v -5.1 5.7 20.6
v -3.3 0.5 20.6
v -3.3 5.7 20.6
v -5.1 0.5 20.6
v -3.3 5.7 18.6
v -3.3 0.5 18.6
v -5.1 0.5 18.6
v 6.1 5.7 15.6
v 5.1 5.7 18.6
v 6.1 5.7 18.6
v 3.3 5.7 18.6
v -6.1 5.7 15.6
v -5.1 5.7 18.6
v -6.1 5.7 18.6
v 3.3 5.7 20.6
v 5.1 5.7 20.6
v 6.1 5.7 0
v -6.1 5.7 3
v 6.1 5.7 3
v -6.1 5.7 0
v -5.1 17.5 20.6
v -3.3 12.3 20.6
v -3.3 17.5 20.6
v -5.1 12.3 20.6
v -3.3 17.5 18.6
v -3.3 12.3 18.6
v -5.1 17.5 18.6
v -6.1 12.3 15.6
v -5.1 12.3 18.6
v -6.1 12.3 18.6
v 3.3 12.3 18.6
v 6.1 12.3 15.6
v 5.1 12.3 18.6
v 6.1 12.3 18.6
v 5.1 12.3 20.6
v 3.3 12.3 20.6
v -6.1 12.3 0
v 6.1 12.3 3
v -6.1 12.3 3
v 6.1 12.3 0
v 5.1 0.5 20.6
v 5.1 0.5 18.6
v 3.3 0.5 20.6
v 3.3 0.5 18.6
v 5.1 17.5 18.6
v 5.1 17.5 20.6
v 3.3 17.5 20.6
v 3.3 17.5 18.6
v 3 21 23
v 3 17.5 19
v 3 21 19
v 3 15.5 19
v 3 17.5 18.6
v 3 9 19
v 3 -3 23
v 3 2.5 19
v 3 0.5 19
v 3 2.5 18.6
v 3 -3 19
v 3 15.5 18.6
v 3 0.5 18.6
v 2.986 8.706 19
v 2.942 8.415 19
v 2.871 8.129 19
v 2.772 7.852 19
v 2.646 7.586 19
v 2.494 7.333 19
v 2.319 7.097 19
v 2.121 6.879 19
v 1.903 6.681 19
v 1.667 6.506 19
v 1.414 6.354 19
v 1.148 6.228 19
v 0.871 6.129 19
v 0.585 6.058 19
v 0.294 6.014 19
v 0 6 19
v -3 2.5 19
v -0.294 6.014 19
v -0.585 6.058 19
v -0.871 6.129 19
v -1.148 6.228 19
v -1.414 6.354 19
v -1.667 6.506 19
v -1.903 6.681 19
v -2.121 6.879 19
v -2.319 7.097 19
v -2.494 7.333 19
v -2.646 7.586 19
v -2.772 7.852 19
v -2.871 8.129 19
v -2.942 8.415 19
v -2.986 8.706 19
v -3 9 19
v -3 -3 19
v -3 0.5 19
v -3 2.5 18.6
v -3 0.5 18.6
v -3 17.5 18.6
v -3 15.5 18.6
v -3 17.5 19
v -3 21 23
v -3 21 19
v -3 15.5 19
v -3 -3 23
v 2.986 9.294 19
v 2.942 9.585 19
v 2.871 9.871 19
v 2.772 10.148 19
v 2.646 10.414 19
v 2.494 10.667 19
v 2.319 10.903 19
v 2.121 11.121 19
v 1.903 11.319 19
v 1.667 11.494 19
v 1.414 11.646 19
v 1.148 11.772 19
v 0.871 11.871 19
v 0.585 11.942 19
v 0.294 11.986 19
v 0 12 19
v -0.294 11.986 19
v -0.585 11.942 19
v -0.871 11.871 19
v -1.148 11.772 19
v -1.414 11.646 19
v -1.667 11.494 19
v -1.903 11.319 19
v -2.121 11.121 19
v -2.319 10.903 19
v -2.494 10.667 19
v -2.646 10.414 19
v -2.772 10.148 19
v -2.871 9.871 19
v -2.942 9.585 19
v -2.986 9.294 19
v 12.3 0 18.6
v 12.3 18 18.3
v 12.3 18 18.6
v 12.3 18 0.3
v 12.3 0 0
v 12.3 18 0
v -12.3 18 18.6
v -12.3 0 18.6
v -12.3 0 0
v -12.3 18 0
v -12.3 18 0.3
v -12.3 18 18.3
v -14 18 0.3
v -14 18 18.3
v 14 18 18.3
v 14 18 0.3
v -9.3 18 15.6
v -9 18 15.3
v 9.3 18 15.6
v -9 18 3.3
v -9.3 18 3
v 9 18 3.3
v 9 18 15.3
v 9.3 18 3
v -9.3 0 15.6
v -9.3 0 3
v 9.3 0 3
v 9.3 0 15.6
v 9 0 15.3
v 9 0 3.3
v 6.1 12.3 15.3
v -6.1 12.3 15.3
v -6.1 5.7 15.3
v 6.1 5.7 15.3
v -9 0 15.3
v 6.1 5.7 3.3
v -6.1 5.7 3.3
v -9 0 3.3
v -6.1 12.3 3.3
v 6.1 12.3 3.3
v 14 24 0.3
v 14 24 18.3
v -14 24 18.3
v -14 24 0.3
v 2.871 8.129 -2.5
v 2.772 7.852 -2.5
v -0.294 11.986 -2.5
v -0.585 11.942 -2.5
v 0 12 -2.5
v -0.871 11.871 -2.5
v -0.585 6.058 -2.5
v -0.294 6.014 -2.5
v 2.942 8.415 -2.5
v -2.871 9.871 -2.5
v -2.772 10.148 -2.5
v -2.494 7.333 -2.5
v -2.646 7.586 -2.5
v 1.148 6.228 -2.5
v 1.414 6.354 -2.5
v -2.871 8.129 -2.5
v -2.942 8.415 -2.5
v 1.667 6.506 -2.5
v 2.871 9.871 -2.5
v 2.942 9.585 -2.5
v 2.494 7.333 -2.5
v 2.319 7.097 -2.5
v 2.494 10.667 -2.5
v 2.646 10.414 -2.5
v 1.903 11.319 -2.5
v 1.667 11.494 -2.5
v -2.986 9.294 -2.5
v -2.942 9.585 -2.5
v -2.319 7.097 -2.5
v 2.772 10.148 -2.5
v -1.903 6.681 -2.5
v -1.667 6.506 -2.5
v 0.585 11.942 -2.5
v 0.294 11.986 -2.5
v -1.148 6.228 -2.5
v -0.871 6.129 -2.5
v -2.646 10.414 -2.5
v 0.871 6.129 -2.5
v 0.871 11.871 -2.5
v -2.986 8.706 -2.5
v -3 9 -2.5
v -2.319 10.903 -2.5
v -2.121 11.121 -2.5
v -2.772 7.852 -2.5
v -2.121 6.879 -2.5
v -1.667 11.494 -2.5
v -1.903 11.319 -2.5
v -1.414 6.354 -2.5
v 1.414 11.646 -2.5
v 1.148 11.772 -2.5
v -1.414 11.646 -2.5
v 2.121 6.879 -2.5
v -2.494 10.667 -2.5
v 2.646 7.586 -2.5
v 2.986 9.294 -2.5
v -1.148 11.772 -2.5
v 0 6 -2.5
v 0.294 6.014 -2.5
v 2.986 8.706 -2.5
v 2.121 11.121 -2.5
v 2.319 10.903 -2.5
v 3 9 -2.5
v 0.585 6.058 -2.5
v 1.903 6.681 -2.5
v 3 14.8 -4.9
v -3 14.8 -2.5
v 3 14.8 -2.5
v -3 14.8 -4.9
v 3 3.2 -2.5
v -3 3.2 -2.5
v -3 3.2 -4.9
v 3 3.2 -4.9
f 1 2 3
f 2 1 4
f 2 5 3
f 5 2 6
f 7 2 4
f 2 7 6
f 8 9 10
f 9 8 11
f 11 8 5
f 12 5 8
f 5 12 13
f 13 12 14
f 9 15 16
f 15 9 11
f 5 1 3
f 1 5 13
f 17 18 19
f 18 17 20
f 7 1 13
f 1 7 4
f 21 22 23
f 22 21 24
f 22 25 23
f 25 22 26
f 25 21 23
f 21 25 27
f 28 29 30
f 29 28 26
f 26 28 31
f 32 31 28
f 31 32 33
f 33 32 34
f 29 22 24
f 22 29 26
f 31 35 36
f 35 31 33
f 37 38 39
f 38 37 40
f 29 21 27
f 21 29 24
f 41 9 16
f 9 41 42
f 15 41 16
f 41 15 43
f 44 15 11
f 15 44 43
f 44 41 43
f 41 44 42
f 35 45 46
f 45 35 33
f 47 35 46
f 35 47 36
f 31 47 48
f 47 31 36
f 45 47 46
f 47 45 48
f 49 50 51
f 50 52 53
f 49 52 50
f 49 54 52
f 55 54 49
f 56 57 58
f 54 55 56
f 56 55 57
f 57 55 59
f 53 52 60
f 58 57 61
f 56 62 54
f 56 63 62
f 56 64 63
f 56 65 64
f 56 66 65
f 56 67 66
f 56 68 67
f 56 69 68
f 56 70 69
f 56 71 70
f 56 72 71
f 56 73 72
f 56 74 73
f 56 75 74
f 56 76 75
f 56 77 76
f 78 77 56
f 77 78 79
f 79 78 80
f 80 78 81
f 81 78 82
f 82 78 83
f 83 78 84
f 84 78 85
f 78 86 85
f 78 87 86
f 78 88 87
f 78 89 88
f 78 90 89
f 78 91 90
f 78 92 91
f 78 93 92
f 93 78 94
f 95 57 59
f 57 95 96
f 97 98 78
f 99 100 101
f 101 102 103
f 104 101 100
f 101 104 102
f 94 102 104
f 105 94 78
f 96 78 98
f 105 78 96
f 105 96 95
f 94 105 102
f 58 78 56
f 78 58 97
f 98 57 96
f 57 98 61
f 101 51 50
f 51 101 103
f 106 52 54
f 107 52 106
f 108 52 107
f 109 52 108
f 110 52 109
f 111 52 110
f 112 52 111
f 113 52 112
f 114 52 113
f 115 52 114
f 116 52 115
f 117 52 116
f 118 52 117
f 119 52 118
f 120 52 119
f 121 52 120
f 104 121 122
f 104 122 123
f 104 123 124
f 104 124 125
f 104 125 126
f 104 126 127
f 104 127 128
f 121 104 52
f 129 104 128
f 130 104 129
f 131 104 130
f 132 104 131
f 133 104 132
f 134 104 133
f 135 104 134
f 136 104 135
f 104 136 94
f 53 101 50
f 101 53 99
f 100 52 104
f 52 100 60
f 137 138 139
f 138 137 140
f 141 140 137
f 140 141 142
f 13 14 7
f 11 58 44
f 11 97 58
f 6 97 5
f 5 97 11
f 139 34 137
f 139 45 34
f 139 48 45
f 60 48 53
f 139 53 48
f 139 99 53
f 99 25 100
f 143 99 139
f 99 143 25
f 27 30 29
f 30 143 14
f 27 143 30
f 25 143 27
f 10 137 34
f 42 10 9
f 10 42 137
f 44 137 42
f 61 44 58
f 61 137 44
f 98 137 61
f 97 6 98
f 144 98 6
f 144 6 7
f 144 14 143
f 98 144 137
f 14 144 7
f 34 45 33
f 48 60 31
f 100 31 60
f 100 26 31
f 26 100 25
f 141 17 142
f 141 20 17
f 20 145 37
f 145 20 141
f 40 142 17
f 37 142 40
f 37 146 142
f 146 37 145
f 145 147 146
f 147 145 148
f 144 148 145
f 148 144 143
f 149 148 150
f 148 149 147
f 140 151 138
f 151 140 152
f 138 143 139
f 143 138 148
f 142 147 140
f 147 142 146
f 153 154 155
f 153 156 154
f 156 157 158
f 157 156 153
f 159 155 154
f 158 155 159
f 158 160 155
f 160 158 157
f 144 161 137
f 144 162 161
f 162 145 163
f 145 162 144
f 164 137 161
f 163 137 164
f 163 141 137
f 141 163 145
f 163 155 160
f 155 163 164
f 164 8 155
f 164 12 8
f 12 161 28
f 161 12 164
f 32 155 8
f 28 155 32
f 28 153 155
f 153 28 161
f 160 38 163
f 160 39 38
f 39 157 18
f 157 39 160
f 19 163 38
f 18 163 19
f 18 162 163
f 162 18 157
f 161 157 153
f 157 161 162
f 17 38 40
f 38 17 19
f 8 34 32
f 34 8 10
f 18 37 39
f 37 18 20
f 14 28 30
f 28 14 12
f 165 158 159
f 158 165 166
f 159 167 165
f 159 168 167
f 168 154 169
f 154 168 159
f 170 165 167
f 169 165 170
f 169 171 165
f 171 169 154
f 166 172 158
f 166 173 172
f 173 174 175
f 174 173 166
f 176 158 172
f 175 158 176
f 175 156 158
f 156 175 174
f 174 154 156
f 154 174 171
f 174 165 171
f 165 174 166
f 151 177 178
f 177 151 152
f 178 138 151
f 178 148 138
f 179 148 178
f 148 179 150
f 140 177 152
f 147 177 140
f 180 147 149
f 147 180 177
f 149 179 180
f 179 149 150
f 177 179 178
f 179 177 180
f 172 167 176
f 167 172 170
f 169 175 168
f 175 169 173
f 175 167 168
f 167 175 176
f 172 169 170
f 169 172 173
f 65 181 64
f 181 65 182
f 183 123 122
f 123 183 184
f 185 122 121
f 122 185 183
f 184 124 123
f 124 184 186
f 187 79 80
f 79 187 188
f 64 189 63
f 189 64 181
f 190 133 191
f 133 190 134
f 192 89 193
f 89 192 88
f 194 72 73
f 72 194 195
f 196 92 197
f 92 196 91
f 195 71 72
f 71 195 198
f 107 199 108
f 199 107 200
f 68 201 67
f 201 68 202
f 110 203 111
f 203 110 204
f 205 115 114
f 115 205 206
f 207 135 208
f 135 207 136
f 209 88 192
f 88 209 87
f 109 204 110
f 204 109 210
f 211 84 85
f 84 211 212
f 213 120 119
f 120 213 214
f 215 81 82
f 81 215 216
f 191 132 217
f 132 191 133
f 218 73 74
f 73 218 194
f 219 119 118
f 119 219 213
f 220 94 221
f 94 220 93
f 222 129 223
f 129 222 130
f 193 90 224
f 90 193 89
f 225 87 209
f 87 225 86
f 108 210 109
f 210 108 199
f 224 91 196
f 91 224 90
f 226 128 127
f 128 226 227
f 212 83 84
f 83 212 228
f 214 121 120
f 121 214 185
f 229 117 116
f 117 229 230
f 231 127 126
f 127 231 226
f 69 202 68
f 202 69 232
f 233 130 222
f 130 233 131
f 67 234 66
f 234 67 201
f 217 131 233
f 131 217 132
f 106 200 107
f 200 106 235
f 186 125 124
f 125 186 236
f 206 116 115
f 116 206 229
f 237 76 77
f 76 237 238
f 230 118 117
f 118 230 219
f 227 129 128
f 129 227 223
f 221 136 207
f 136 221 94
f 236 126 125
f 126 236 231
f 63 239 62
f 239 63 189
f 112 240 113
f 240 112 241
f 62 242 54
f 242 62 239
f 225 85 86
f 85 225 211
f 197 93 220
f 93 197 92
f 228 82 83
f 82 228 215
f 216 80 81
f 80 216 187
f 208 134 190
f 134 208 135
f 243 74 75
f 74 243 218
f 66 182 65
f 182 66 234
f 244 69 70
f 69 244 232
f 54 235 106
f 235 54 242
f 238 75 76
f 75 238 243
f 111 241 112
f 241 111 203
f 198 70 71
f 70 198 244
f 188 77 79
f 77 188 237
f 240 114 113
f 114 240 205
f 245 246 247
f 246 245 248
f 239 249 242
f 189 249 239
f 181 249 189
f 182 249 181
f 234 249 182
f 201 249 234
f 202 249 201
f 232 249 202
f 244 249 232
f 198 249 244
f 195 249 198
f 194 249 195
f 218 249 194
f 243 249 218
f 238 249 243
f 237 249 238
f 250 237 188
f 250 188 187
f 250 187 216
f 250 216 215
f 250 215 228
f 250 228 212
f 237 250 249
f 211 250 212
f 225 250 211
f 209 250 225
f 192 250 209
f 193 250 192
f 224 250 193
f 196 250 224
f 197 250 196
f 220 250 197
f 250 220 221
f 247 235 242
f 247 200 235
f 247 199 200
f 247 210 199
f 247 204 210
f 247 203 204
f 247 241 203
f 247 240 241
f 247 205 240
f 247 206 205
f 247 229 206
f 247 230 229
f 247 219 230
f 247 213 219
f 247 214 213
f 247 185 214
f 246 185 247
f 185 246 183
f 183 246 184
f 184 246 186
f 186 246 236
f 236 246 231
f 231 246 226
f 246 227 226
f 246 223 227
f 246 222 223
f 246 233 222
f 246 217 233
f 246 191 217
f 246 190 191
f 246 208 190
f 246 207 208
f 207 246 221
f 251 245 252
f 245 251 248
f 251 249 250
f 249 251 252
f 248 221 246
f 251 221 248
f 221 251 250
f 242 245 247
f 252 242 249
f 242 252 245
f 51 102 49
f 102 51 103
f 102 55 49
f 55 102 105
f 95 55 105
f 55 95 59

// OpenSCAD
// V8 REAR-JOINT COUPON ONLY. V7 rear connection retired after stuck/broken key.
// All PLA. No full support or brace revision is released by this file.
// Nominal values are trial fits, not empirically calibrated.
part="assembly"; // receiver, tongue, keeper, assembly, unlocked, exploded
$fn=64;
// Assembly coordinates: X across brace, Y tongue insertion, Z vertical.
// Receiver Y=0..18; tongue withdraws toward +Y. Keeper axis is Z.
receiver_w=24.6; receiver_l=18; receiver_h=18.6;
tongue_w=18; tongue_h=12; tongue_l=18;
slide_clearance=.3; // EACH FACE, total .6 mm in X and Z
keyhole_x=12.2;keyhole_y=6.6;
shaft_d=6; key_foot_x=11.6; key_foot_y=6;
head_z=19; head_top=23; lift=1.8;
module box(a,b){translate(a)cube(b-a);}
module receiver(){difference(){union(){
 box([-receiver_w/2,0,0],[receiver_w/2,receiver_l,receiver_h]);
 // Four open indexing posts. LOCKED handle runs along Y between X posts.
 for(sx=[-1,1])for(sy=[-1,1])translate([0,9,0])scale([sx,sy,1])
  box([3.3,3.3,18.4],[5.1,8.5,20.6]);
 // Small seats support the underside of the locked handle at z=19.
 for(sy=[-1,1])translate([0,9,0])scale([1,sy,1])
  box([-3,6.5,18.4],[3,8.5,19]);
}
 // Open through both ends: no blind end to wedge against.
 box([-tongue_w/2-slide_clearance,-.1,3],[tongue_w/2+slide_clearance,18.1,3+tongue_h+2*slide_clearance]);
 box([-keyhole_x/2,9-keyhole_y/2,-.1],[keyhole_x/2,9+keyhole_y/2,24]);
}}
module tongue(){difference(){union(){
 box([-9,0,3.3],[9,18.2,15.3]);
 box([-14,18,.3],[14,24,18.3]); // exposed pad represents rear-brace panel
}
 box([-keyhole_x/2,9-keyhole_y/2,3.2],[keyhole_x/2,9+keyhole_y/2,15.4]);
}}
// Unlocked keeper: foot and handle long axis X. Rotate +90 deg about Z to lock.
// Printed lying flat: all head/foot faces share Y=-3, no elevated grip overhang.
module keeper(){union(){
 translate([0,9,-2.7])cylinder(d=shaft_d,h=head_z+2.9);
 box([-key_foot_x/2,9-key_foot_y/2,-4.9],[key_foot_x/2,9+key_foot_y/2,-2.5]);
 box([-12,6,head_z],[12,12,head_top]);
}}
module turn_key(angle=90,dz=0){translate([0,9,dz])rotate([0,0,angle])translate([0,-9,0])keeper();}
module receiver_print(){multmatrix([[0,1,0,0],[0,0,1,0],[1,0,0,12.3],[0,0,0,1]])receiver();}
module tongue_print(){multmatrix([[1,0,0,14],[0,0,1,-.3],[0,-1,0,24],[0,0,0,1]])tongue();}
module keeper_print(){multmatrix([[0,0,1,4.9],[1,0,0,12],[0,1,0,-6],[0,0,0,1]])keeper();}
if(part=="receiver")receiver_print();
else if(part=="tongue")tongue_print();
else if(part=="keeper")keeper_print();
else if(part=="assembly"){
 color("silver")receiver();color("steelblue")tongue();color("orange")turn_key();
} else if(part=="unlocked"){
 color("silver")receiver();color("steelblue")tongue();color("orange")turn_key(0,lift);
} else if(part=="exploded"){
 color("silver")receiver();color("steelblue")translate([0,30,0])tongue();color("orange")turn_key(0,32);
} else assert(false,"Unknown selector");
